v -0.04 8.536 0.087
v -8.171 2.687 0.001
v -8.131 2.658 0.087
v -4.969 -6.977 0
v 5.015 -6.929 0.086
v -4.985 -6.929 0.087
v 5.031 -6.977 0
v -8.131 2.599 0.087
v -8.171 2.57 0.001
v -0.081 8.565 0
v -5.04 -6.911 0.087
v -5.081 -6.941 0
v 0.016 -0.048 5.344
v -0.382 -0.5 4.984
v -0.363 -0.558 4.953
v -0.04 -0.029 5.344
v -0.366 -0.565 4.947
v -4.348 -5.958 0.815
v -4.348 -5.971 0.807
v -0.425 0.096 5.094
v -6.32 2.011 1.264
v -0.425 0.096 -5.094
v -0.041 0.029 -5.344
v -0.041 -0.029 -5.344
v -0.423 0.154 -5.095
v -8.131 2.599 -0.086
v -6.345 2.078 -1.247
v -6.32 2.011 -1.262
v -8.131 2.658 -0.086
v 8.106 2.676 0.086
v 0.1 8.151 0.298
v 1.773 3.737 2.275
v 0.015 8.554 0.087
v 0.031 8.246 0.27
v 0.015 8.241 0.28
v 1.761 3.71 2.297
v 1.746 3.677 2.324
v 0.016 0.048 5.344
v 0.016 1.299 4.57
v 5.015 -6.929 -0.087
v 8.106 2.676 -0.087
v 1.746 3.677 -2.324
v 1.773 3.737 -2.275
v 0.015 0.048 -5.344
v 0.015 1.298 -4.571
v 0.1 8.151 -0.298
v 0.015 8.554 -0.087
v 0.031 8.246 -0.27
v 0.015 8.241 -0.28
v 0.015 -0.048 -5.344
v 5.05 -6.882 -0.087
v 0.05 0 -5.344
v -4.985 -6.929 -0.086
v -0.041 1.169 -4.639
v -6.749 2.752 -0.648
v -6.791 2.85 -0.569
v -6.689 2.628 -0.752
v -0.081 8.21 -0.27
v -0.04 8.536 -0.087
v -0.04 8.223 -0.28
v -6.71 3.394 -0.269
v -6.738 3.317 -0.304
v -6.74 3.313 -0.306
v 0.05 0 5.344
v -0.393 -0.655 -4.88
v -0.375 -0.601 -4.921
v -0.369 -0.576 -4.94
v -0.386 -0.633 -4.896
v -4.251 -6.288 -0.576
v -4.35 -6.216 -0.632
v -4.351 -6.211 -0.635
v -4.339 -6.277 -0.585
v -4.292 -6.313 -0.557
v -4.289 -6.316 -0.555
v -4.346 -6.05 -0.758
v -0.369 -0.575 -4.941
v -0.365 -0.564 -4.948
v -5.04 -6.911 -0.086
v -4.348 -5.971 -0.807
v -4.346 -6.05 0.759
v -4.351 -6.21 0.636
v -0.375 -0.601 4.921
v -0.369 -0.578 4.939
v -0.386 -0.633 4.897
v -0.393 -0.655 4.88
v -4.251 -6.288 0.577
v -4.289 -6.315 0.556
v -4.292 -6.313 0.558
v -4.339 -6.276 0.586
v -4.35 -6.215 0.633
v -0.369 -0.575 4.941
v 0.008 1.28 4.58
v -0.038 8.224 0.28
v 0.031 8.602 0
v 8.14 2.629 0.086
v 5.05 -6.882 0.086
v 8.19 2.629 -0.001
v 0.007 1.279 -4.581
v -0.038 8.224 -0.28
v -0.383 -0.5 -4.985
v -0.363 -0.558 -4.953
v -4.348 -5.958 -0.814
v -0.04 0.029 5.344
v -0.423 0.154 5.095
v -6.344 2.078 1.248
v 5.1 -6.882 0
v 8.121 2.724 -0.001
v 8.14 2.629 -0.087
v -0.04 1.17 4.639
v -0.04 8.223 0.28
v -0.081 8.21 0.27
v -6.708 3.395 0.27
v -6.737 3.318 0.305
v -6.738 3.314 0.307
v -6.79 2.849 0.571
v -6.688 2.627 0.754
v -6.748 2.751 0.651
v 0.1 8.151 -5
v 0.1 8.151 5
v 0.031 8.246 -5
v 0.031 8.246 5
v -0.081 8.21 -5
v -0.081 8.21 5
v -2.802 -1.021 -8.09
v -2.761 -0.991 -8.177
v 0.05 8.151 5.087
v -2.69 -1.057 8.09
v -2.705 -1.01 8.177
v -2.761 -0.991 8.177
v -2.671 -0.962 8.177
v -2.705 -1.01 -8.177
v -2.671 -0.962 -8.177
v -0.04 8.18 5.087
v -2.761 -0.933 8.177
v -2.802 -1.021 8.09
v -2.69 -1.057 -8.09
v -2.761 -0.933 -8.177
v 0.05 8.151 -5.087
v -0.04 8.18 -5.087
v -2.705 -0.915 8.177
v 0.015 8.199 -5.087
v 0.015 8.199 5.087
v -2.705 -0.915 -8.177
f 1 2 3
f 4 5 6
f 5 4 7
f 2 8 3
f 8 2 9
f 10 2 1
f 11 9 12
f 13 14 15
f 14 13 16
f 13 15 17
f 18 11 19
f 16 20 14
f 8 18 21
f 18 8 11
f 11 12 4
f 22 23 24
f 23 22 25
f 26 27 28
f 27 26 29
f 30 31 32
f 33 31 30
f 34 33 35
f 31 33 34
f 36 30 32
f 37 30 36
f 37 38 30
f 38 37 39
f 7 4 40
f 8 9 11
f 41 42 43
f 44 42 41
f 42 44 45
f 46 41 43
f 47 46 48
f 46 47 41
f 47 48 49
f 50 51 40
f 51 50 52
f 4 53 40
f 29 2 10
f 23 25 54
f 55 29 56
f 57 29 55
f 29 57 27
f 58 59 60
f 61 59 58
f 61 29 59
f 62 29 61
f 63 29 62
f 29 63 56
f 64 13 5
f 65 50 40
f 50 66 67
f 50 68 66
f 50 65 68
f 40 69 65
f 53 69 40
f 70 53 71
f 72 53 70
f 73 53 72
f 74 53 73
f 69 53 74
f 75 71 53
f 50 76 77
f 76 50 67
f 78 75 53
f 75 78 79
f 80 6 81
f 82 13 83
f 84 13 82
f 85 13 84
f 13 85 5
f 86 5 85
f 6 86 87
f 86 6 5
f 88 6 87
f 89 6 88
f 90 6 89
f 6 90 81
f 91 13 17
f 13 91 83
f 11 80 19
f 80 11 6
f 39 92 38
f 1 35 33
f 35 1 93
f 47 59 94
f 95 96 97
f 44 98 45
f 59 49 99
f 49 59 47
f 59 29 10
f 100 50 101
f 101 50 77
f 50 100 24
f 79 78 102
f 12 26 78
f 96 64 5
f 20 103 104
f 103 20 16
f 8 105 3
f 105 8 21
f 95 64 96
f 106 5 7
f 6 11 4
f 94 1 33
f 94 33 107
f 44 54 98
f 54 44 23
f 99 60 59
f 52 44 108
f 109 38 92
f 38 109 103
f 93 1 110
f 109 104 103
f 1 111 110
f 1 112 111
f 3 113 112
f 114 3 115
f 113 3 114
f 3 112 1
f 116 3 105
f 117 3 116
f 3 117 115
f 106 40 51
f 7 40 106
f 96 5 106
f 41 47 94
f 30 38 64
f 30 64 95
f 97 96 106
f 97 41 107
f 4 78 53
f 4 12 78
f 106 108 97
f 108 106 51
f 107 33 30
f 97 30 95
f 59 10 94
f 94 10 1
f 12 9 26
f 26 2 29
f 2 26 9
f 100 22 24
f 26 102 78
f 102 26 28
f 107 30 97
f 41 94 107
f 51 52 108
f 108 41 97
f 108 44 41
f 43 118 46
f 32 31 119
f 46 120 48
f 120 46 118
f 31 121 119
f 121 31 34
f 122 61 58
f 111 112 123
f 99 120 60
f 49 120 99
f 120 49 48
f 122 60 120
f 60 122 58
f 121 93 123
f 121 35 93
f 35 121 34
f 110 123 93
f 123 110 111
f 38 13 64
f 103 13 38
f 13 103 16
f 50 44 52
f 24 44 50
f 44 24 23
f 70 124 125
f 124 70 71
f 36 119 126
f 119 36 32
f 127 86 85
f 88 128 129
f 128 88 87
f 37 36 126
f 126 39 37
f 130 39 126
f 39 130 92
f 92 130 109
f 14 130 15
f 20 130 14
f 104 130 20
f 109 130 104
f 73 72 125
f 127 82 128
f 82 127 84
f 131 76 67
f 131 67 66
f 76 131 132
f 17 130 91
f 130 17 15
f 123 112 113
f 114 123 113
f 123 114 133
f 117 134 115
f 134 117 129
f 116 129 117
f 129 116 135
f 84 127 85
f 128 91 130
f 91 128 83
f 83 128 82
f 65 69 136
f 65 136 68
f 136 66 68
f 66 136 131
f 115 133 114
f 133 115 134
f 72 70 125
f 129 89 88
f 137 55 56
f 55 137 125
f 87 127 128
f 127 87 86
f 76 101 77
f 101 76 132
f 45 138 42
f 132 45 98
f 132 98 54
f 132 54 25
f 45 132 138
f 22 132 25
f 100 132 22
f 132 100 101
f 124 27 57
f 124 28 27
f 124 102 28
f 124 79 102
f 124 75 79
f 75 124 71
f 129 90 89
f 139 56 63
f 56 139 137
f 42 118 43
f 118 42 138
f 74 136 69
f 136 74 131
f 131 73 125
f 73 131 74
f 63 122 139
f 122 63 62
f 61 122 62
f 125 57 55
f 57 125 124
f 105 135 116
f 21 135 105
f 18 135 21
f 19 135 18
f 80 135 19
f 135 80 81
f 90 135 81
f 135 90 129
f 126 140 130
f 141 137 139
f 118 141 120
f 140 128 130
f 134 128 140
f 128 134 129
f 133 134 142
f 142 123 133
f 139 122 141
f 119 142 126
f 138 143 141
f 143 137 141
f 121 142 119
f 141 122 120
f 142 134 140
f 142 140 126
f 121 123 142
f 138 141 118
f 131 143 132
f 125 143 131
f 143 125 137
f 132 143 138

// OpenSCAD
// Auto-generated OpenSCAD file

    inner_points = 10*[[-0.7006292682253485, 0.30606485476032513, -6.130120740868102e-13], [0.30689198471783646, 0.005276334587299036, 6.130120740868102e-13], [-0.2720657717976499, -0.09620971856082147, 0.8090169943752502], [-0.27206577179637514, -0.09620971856314678, -0.8090169943746447], [5.5554147393444e-10, 0.8151018158228152, 0.49999999999920747], [5.563293437038652e-10, 0.8151018158213781, -0.5000000000007926], [-0.4402116662866258, -0.6594312211511645, 9.79654968021913e-13]];

    outer_points = 10*[[-3.627212082769728e-05, 5.120611380175485e-06, -0.5257311108429229], [3.627212082769728e-05, -5.120611380175485e-06, 0.5257311108429229], [0.8090169926260806, 0.26286555604709816, -5.325674888357133e-05], [-0.8090169922727908, 0.26286555604709816, 5.837736025155943e-05], [0.4999999983475059, -0.6881909602029435, -4.1199804176948946e-05], [-0.4999999992724306, -0.6881909602029435, 2.779386957237699e-05], [5.716348896531026e-10, 0.8506508083116905, 8.285323236583849e-06]];

    // Convex hull for inner set (I)
    module inner_hull() {
        hull() {
            for (p = inner_points) {
                translate(p) sphere(r=0.1);
            }
        }
    }

    // Convex hull for outer set (O) minus inner hull (O \ I)
    module outer_minus_inner() {
        difference() {
            hull() {
                for (p = outer_points) {
                    translate(p) sphere(r=0.1);
                }
            }
            inner_hull(); // Subtract inner hull
        }
    }

    // Convex hull for outer set (O) minus all translated inner hulls
    module outer_minus_AllTranslationInner() {
        difference() {
            hull() {
                for (p = outer_points) {
                    translate(p) sphere(r=0.1);
                }
            }
            hull() {
                translate([0,0,50]) inner_hull();
                translate([0,0,-50]) inner_hull();
            }; // Subtract translated inner hulls
        }
    }

    // Difference between outer_minus_inner and outer_minus_AllTranslationInner
    module outer_minus_inner_diff() {
        difference() {
            // Outer minus inner
            difference() {
                hull() {
                    for (p = outer_points) {
                        translate(p) sphere(r=0.1);
                    }
                }
                inner_hull();
            }

            // Subtract Outer minus AllTranslationInner
            difference() {
                hull() {
                    for (p = outer_points) {
                        translate(p) sphere(r=0.1);
                    }
                }
                hull() {
                    translate([0,0,50]) inner_hull();
                    translate([0,0,-50]) inner_hull();
                };
            }
        }
    }

    // Rendering all with colors applied
    color([1, 0, 0, 0.5]) inner_hull(); // Transparent red
    color([0, 1, 0, 1]) outer_minus_AllTranslationInner(); // Opaque green
    color([1, 1, 0, 1]) outer_minus_inner_diff(); // Opaque yellow
    
